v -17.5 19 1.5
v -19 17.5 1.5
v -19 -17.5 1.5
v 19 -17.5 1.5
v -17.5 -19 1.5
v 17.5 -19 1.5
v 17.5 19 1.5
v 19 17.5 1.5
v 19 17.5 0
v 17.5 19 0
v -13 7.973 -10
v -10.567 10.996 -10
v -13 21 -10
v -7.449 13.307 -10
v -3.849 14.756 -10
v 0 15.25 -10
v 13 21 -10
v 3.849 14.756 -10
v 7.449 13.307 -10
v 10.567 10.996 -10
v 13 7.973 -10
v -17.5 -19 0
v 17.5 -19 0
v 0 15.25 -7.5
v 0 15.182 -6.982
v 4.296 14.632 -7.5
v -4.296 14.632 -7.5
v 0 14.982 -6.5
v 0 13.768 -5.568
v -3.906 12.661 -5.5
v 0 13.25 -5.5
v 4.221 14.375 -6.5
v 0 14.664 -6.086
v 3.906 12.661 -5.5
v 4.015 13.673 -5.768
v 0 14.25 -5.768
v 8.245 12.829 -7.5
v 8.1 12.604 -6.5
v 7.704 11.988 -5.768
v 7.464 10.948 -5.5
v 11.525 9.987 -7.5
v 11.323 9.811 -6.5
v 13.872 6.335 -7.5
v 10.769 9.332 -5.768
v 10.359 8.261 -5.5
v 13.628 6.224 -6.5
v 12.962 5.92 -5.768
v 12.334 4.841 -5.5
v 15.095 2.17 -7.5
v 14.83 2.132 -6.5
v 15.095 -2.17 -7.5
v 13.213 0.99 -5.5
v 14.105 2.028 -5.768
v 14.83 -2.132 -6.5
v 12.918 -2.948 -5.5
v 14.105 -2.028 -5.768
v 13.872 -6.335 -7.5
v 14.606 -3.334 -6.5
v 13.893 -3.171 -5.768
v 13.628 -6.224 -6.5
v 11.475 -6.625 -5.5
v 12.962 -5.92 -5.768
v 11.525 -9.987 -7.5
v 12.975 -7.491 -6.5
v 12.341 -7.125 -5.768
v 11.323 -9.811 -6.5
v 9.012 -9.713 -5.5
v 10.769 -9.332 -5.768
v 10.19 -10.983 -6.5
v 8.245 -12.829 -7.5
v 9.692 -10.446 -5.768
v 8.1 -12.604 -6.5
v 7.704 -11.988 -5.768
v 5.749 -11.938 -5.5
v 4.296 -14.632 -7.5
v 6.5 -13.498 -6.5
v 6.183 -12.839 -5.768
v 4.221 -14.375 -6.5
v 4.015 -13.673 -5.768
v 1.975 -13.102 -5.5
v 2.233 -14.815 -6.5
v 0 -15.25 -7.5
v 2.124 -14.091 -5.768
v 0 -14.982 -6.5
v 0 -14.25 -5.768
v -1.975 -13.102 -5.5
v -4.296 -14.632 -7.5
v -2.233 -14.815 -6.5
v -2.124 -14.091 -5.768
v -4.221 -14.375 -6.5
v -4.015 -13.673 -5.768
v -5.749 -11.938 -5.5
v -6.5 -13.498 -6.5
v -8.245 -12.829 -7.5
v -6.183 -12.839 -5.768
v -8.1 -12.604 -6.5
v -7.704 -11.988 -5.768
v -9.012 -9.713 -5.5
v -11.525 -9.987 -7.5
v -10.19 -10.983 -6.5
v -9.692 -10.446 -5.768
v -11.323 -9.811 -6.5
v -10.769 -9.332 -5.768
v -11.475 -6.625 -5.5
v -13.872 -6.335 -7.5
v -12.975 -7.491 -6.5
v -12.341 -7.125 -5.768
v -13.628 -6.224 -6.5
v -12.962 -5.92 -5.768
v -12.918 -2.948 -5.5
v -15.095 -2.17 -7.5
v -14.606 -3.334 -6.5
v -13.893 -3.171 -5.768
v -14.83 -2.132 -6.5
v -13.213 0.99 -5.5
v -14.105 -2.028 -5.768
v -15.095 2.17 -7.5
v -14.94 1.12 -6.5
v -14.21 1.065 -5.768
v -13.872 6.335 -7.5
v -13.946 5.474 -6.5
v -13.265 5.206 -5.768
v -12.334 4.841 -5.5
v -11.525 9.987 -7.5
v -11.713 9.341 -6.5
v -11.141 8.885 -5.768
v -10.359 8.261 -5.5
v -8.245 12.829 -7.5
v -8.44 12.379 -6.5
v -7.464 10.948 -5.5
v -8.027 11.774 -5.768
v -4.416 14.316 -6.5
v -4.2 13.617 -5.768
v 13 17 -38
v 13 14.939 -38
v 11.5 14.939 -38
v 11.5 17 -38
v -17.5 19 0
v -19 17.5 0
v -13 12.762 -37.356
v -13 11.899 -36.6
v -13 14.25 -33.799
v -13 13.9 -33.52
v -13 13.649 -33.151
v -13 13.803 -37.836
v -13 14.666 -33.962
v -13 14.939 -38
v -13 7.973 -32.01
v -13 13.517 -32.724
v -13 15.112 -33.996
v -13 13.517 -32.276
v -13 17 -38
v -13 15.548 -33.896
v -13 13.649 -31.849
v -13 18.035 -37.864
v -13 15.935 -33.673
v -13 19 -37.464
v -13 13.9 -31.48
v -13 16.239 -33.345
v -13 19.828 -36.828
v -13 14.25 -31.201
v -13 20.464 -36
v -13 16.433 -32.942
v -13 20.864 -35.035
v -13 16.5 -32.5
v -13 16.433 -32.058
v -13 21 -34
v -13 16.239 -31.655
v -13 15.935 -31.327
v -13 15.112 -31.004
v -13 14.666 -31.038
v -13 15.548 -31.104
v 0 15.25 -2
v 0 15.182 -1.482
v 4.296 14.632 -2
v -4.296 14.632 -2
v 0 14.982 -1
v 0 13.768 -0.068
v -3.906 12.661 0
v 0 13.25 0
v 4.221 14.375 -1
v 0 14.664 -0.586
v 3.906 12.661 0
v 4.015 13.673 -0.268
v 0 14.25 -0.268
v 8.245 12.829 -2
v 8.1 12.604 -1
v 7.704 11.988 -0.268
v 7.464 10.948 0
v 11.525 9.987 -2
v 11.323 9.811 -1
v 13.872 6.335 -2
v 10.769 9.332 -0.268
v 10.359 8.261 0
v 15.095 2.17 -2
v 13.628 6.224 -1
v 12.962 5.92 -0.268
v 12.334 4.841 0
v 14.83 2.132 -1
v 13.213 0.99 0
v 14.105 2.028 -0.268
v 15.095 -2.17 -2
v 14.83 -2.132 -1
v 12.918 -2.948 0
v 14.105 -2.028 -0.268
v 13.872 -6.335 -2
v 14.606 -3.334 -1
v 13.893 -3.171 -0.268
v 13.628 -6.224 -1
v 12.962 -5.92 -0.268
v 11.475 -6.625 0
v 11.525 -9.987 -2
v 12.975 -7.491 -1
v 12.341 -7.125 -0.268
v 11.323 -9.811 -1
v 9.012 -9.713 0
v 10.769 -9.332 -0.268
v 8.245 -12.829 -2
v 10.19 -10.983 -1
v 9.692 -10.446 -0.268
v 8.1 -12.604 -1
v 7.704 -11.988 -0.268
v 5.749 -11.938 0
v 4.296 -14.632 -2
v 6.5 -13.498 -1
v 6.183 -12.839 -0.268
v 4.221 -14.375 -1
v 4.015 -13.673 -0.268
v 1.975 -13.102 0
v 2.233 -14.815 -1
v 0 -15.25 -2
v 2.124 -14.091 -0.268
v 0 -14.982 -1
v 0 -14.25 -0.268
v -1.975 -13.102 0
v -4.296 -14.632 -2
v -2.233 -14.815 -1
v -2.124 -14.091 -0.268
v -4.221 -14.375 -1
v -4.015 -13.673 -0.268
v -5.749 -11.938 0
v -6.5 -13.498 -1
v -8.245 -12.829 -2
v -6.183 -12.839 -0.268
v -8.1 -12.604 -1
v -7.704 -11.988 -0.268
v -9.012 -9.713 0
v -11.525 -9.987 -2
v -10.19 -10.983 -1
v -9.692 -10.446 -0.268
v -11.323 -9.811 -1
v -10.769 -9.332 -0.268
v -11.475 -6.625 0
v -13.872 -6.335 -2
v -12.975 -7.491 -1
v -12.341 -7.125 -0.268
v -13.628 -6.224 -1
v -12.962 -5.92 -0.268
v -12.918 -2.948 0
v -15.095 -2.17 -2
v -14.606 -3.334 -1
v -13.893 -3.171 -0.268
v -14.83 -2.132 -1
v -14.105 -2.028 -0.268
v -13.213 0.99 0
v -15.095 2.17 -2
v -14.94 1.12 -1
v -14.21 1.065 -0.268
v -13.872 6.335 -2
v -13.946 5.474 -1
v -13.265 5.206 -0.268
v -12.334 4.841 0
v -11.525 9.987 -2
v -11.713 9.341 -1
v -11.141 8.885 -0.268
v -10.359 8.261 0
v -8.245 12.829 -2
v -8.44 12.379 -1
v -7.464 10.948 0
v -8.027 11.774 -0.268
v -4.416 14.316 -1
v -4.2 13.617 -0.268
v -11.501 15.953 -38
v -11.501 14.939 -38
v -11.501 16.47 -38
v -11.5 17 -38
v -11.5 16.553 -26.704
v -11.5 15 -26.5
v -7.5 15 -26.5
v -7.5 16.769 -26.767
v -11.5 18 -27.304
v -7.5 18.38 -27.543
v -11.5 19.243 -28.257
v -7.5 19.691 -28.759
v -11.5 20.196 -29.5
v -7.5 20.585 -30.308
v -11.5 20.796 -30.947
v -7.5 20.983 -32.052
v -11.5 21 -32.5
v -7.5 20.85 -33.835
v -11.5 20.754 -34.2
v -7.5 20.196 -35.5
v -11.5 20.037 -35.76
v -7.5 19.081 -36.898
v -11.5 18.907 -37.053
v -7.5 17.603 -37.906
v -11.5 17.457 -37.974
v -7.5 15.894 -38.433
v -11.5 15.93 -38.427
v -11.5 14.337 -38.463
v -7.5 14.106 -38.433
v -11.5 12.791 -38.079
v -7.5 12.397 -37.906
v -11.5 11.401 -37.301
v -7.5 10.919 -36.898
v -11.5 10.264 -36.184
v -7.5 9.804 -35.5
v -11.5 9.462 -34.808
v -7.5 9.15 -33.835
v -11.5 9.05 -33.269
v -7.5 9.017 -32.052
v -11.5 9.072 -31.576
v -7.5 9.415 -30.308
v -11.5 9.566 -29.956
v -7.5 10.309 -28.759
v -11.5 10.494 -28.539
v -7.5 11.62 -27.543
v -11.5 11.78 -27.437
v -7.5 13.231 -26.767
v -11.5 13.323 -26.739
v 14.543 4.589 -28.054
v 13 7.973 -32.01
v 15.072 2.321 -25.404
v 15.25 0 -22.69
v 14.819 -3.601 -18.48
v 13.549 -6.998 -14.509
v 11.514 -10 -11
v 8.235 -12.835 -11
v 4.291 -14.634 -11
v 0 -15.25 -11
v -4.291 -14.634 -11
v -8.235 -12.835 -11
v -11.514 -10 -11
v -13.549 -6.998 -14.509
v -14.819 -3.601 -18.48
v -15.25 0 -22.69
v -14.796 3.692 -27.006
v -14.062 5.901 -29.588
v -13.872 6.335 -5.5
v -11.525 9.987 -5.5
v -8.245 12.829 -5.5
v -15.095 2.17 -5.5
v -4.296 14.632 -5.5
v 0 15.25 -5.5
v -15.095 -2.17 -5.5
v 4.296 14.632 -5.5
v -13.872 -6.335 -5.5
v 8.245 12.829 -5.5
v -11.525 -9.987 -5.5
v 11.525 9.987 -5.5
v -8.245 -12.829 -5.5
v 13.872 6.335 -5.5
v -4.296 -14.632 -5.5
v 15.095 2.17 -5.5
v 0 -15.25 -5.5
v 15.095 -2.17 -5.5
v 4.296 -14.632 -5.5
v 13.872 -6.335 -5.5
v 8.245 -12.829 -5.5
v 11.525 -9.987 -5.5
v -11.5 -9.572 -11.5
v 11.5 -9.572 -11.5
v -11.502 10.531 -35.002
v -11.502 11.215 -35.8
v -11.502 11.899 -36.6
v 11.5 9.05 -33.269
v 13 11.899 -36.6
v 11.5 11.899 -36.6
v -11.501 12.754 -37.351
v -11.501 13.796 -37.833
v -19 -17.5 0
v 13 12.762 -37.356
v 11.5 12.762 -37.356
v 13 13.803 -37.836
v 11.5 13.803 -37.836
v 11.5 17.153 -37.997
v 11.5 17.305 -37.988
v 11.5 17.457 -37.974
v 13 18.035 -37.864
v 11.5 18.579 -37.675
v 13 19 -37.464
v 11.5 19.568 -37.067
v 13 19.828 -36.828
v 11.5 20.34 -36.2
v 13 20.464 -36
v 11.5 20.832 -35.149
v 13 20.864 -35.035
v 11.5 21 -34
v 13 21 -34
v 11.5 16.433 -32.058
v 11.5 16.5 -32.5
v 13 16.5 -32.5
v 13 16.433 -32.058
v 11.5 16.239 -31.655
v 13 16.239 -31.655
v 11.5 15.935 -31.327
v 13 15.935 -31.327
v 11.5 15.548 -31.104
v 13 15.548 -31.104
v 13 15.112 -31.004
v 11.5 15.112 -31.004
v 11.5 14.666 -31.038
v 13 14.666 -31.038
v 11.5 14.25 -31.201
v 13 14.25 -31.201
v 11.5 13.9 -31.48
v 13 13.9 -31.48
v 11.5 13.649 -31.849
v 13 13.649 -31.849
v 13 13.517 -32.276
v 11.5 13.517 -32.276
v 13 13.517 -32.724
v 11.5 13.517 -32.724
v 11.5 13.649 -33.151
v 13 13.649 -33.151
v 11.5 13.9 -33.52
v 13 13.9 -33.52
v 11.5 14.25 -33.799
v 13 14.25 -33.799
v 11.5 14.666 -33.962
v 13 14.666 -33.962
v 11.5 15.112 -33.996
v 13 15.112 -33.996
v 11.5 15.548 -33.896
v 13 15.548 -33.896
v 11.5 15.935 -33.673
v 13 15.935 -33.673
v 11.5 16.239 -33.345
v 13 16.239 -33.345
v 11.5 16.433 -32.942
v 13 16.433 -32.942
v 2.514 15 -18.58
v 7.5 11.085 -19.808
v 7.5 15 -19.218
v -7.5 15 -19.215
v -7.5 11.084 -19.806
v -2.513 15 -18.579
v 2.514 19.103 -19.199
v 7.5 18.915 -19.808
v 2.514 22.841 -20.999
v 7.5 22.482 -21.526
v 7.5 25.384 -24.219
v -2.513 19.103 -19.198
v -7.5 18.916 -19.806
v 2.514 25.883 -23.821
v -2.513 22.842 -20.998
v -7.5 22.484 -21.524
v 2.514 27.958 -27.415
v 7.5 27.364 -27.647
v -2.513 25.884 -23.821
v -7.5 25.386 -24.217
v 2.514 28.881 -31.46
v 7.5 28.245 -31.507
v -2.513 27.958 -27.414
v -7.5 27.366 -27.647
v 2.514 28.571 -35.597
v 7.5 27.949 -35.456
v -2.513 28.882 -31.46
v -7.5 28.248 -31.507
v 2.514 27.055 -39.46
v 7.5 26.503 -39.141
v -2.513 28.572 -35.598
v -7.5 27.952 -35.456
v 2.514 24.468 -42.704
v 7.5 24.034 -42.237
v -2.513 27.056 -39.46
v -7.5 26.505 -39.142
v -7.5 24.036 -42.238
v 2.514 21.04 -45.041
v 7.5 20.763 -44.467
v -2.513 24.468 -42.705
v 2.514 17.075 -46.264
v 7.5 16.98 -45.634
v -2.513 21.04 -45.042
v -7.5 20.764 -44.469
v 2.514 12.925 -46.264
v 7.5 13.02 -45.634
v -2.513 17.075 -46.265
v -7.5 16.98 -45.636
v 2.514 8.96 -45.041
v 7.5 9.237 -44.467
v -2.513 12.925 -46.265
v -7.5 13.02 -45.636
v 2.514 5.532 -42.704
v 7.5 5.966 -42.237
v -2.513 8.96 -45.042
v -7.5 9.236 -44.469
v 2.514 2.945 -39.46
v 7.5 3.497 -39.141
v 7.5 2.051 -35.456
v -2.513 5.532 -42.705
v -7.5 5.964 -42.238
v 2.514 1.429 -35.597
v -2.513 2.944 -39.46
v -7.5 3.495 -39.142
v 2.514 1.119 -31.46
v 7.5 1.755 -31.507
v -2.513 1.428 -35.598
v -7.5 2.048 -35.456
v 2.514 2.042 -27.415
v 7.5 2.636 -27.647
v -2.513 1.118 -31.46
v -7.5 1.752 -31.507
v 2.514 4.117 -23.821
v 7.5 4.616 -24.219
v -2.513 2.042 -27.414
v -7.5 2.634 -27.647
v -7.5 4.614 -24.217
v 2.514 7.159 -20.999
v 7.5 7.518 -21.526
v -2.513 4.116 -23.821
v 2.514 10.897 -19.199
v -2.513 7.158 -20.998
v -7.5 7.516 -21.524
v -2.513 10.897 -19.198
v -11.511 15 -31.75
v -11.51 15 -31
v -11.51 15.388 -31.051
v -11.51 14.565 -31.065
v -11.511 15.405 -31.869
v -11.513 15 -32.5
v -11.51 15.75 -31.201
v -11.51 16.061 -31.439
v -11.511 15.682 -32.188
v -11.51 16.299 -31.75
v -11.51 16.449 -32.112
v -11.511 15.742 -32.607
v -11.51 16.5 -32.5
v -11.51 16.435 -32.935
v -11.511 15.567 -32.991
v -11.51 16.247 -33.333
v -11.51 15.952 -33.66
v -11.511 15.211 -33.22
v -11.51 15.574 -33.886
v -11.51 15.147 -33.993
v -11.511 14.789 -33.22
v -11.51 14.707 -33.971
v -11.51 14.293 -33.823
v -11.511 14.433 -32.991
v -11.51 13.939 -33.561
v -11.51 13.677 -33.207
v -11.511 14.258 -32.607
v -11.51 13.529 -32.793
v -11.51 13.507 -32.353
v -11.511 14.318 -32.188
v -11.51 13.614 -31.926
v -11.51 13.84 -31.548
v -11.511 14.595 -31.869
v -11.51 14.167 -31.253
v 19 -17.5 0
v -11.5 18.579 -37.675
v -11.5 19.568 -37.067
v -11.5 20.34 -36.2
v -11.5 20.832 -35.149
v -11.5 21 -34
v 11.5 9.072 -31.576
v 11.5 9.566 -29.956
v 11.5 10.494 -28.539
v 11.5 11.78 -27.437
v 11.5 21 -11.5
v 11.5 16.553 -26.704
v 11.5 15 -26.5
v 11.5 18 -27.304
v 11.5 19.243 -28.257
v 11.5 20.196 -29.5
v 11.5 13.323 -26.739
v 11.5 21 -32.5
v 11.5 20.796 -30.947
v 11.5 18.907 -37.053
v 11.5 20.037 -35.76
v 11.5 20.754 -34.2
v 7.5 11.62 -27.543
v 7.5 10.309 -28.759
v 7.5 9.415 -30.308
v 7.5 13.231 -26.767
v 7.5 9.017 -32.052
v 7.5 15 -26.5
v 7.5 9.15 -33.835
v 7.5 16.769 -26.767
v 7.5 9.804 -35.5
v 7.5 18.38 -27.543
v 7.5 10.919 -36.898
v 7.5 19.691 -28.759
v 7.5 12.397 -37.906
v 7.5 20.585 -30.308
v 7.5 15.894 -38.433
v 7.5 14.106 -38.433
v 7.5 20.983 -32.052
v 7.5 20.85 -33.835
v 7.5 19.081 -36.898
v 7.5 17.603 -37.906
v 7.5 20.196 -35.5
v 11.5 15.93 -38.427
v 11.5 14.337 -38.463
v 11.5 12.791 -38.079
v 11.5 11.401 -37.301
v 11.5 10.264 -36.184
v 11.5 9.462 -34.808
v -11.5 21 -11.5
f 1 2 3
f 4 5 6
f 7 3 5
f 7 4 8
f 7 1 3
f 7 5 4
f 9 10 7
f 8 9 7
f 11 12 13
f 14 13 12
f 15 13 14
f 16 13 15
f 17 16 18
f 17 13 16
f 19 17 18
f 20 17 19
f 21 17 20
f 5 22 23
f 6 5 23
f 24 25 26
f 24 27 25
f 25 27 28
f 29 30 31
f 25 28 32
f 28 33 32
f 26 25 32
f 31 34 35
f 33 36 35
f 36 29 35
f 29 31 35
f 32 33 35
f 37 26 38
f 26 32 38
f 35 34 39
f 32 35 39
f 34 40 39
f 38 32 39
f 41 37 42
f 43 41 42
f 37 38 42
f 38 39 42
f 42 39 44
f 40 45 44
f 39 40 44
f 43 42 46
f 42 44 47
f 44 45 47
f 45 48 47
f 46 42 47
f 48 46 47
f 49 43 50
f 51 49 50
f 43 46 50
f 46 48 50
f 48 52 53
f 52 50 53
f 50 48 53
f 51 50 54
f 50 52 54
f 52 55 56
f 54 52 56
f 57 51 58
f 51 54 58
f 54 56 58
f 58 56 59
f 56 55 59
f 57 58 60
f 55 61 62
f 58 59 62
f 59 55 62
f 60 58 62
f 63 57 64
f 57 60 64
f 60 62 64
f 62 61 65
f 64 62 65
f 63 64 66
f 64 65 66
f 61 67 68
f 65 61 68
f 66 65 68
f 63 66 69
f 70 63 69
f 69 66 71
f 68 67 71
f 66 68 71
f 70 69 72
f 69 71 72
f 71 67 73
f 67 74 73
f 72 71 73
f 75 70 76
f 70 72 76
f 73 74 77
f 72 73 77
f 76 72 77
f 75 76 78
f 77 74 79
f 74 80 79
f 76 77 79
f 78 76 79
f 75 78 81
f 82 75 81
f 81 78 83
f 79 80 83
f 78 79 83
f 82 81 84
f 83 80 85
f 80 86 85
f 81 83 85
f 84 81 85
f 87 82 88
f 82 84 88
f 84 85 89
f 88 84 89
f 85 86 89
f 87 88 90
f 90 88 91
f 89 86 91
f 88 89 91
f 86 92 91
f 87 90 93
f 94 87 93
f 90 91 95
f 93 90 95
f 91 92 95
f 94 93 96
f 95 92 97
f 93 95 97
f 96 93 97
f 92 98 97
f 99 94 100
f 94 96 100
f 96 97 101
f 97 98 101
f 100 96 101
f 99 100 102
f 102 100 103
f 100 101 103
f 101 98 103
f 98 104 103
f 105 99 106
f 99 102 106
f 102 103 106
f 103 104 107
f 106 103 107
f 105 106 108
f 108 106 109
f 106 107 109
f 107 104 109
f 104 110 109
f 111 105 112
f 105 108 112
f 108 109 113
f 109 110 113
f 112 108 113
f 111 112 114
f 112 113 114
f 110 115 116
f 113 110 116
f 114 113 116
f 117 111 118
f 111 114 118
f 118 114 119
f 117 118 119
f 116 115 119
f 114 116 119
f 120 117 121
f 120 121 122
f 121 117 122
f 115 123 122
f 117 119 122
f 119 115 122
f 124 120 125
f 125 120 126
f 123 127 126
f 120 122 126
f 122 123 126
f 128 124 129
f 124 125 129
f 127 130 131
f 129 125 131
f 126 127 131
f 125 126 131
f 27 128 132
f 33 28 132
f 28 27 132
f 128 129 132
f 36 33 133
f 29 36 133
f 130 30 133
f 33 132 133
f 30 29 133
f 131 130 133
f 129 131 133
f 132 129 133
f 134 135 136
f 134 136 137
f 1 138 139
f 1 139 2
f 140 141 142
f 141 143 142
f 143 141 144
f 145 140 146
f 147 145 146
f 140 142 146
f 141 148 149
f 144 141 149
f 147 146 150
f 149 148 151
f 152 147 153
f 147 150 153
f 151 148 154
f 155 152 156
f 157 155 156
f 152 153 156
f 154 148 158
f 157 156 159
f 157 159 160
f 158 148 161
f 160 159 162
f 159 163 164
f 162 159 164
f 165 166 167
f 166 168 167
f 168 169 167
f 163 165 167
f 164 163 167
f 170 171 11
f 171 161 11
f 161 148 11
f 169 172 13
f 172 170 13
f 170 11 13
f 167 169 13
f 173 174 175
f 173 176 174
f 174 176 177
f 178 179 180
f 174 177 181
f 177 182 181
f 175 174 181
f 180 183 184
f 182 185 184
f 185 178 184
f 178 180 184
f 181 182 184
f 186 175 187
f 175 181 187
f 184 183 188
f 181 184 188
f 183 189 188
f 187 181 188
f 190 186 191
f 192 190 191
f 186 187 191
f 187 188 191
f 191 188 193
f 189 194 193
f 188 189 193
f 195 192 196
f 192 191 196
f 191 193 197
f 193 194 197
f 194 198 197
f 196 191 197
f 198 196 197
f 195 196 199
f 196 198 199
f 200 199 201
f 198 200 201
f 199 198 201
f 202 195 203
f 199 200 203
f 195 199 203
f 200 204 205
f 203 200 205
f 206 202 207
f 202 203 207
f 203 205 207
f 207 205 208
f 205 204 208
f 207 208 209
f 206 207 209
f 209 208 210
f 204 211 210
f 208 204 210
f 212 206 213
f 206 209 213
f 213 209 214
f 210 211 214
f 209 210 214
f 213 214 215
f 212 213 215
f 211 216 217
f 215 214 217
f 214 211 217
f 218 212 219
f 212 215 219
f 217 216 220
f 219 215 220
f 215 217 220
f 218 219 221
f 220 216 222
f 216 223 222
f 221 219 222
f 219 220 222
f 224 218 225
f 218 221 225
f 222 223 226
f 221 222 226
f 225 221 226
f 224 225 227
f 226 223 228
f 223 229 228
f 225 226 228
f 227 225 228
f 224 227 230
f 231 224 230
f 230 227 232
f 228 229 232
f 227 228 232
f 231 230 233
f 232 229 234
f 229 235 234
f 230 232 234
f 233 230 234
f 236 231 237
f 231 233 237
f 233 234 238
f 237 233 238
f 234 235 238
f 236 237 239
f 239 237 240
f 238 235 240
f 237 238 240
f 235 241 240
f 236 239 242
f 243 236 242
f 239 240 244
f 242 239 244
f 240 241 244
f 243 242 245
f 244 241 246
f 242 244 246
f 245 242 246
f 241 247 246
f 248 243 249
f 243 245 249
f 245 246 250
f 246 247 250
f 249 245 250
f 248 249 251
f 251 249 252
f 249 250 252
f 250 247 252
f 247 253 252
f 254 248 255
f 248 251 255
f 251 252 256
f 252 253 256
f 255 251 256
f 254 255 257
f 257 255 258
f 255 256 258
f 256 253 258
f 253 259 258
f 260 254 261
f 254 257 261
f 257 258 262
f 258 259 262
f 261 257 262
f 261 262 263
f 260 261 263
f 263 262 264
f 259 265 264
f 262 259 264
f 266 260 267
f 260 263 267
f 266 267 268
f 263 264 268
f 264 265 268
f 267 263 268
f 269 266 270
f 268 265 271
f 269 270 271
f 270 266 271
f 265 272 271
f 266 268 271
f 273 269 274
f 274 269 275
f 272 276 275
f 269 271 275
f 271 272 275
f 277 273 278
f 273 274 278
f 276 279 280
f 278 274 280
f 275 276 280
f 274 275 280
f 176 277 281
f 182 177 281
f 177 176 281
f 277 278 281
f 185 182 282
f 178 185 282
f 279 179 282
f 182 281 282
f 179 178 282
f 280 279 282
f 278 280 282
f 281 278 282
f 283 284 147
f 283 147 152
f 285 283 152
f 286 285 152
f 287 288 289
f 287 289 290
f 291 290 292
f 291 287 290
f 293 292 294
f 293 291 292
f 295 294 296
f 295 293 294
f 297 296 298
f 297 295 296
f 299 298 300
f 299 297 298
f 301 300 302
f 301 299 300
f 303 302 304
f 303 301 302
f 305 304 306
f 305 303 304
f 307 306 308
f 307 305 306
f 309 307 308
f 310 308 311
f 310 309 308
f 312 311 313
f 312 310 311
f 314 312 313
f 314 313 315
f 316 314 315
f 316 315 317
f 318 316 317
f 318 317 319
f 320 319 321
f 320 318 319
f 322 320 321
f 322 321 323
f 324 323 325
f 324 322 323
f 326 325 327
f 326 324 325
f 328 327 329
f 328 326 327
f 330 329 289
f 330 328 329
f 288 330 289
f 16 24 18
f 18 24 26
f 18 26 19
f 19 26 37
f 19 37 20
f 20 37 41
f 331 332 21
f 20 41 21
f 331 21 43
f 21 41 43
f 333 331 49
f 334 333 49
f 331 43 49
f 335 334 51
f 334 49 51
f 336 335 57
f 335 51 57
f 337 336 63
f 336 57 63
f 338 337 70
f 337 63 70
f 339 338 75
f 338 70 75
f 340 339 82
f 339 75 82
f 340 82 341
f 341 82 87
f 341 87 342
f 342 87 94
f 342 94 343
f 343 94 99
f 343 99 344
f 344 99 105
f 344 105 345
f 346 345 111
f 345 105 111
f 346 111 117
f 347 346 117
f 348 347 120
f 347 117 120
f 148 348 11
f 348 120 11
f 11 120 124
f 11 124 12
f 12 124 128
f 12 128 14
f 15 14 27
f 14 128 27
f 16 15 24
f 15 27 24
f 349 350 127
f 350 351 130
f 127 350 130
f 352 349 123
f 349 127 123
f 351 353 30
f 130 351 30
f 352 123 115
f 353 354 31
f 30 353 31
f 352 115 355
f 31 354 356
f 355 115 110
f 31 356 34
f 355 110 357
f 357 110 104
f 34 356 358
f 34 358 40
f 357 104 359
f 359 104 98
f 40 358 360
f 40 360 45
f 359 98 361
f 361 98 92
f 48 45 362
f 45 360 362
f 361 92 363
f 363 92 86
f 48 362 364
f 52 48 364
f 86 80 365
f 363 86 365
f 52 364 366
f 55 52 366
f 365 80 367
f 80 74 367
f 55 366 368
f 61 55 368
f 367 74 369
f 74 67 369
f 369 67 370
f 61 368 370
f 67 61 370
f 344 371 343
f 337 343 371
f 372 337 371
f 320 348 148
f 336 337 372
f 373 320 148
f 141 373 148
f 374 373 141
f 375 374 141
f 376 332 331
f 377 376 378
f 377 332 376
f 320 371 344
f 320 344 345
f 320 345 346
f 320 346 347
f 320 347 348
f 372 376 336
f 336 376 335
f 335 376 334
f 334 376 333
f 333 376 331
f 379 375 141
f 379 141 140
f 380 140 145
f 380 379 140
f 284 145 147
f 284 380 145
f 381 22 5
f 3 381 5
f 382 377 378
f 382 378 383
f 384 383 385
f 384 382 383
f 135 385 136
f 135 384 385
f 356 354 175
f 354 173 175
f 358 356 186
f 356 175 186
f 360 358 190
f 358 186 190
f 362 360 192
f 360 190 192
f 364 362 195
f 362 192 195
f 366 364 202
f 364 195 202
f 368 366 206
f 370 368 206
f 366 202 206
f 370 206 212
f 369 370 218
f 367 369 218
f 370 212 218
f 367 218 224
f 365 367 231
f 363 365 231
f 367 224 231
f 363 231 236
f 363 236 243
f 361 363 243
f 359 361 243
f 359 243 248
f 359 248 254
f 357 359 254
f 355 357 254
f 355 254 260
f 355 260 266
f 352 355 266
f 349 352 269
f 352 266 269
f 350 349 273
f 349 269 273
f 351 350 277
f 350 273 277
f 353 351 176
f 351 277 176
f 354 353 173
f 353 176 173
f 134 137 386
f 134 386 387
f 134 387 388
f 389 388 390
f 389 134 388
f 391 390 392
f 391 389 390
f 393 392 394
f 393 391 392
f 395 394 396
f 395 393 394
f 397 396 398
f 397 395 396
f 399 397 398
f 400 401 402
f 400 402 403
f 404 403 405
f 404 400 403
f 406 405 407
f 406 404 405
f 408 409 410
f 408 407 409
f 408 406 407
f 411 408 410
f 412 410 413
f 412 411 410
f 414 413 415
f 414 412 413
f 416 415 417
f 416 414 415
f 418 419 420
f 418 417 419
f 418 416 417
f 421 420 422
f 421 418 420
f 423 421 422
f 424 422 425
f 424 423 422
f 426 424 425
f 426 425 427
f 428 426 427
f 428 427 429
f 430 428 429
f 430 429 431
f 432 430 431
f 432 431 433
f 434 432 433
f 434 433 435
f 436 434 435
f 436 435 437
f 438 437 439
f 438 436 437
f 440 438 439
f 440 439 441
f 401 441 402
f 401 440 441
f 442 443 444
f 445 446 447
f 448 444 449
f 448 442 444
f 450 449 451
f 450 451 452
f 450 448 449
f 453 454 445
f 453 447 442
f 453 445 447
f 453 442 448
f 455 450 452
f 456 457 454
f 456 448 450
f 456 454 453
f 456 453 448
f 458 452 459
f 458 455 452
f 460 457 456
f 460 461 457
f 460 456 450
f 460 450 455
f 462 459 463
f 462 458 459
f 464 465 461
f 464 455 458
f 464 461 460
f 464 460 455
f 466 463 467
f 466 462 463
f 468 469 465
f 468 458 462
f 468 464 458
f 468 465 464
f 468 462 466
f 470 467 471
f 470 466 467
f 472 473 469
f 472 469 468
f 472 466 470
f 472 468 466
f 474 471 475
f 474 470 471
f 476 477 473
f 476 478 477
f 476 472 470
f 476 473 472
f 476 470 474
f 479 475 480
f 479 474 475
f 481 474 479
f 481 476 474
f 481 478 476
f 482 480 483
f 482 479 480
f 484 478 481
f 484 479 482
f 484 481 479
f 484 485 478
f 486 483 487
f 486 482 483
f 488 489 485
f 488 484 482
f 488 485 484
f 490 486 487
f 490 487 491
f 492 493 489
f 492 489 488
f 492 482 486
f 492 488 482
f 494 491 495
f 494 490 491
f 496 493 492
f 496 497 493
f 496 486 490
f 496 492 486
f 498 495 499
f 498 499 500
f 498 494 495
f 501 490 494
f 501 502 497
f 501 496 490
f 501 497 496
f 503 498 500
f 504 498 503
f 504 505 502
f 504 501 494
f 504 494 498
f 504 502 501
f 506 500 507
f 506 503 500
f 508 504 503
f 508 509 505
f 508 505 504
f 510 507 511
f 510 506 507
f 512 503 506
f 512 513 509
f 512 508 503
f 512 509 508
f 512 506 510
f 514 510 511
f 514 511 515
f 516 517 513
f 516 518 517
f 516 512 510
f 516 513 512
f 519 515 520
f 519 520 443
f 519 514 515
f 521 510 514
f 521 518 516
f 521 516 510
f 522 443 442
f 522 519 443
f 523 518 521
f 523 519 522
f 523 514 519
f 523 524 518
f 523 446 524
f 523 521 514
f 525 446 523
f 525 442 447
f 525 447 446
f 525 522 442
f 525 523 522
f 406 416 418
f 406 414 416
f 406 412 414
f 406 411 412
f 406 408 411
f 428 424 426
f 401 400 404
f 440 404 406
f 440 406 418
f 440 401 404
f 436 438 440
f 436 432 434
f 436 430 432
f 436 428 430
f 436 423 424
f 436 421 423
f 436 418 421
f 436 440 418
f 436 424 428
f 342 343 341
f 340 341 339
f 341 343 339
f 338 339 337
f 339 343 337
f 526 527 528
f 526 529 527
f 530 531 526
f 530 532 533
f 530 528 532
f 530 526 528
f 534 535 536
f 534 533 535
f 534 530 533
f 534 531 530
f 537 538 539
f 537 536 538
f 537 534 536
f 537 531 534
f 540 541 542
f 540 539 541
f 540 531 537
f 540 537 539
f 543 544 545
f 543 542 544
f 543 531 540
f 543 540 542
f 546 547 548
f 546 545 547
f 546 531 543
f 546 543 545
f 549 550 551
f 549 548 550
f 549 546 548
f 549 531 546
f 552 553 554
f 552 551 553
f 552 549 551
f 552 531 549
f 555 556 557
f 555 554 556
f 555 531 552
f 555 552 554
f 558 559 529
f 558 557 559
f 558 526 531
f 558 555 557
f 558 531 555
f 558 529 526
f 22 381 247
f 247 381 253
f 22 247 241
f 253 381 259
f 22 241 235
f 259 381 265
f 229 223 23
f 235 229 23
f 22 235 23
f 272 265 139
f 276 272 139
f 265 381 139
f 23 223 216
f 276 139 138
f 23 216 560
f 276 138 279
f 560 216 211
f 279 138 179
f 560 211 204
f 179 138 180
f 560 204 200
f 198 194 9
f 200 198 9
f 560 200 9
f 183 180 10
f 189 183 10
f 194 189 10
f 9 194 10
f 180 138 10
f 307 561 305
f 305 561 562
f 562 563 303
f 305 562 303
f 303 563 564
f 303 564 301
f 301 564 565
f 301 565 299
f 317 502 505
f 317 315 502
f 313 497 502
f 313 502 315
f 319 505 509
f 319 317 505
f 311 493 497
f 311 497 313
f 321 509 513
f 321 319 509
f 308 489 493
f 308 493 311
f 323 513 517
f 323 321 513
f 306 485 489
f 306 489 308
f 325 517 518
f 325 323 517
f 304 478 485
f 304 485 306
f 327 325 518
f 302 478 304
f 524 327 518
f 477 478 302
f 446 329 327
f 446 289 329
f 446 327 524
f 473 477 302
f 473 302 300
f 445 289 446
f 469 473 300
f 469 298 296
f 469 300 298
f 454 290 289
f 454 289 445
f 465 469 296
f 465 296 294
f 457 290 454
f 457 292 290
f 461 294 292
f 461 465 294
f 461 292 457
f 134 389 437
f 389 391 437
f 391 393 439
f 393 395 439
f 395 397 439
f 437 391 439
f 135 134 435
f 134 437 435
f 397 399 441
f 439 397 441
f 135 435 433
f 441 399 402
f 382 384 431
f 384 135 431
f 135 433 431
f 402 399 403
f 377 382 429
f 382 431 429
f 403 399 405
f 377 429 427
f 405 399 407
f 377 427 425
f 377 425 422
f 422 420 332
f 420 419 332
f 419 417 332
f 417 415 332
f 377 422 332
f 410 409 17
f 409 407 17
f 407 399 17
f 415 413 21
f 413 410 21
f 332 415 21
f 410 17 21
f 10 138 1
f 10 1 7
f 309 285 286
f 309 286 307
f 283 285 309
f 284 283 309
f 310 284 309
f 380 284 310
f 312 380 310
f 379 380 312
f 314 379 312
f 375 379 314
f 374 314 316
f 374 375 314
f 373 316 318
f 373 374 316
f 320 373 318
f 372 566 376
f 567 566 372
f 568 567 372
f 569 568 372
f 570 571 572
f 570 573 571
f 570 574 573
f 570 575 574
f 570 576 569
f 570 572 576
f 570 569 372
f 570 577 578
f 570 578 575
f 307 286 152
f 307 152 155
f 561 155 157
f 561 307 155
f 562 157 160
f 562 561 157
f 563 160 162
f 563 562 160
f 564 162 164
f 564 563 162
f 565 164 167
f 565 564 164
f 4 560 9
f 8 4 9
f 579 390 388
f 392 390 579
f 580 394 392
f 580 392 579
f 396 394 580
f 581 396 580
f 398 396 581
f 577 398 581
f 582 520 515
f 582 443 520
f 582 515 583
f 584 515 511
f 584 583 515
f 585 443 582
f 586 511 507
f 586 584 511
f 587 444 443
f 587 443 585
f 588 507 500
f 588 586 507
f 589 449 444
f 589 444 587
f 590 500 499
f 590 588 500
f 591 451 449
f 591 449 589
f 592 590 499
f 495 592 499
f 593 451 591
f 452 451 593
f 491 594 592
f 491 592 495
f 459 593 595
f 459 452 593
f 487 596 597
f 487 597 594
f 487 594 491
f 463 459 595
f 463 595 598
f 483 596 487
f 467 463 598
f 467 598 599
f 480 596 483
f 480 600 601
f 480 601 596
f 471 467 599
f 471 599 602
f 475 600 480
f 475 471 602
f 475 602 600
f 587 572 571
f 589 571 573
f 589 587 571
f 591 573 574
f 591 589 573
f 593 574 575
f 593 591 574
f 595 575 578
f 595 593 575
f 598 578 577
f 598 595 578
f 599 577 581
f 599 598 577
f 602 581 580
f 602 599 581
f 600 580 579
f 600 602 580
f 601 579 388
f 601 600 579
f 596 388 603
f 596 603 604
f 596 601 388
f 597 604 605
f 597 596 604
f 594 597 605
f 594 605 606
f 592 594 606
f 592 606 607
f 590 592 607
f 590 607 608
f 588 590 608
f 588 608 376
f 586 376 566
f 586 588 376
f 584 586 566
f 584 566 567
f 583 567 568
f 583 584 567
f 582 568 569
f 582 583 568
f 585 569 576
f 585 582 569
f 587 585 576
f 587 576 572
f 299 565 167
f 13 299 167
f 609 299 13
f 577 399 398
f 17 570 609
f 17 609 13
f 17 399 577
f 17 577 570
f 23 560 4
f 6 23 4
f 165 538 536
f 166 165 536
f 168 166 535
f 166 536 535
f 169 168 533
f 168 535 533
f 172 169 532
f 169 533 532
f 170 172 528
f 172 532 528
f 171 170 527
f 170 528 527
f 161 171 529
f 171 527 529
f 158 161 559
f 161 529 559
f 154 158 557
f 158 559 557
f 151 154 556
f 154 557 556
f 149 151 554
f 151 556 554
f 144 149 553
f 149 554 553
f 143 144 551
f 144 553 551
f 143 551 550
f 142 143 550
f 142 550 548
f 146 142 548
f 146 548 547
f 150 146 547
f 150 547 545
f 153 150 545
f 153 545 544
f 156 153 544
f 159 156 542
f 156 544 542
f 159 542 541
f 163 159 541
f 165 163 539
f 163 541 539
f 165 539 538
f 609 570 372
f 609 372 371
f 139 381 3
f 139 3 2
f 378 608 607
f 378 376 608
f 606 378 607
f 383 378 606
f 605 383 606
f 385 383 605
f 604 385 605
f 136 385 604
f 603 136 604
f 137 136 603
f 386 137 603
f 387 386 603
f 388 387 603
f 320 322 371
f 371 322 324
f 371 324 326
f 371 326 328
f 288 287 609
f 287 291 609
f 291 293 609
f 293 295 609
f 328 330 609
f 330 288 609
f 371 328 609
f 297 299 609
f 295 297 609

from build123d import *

# Parameters (mm, degrees)
F0_W          = 38
F0_H          = 38
F1_DEPTH      = 1.5
F2_SIZE       = 1.5
F5_R          = 1.5
F6_DEPTH      = 15.25
F6_DEPTH_BACK = 15.25
F8_DEPTH      = 30
F9_W          = 23
F9_H          = 35
F10_DEPTH     = 40.001


with BuildPart() as f1:
    # F0 (on Top) → F1 (new body)
    with BuildSketch(Plane.XY):
        Rectangle(F0_W, F0_H)
    extrude(amount=F1_DEPTH)

    # F2
    f2_edges = [f1.edges().sort_by_distance(p)[0] for p in [
        (-19, 19, 0.75),
        (-19, -19, 0.75),
        (19, -19, 0.75),
        (19, 19, 0.75),
    ]]
    chamfer(f2_edges, length=F2_SIZE)

    # F3 (on Right) → F4 (revolve)
    with BuildSketch(Plane.YZ):
        with BuildLine():
            Line((13.25, 0), (0, 0))
            Line((0, 0), (0, -11))
            Line((0, -11), (15.25, -11))
            Line((15.25, -11), (15.25, -7.5))
            ThreePointArc((15.25, -7.5), (14.6642135624, -6.0857864376), (13.25, -5.5))
            Line((13.25, -5.5), (15.25, -5.5))
            Line((15.25, -5.5), (15.25, -2))
            ThreePointArc((15.25, -2), (14.6642135624, -0.5857864376), (13.25, 0))
        make_face()
    revolve(axis=Axis((0, 0, -0.5291854686), (0, 0, -1)))

    # F5 (on Right) → F6 (join, two sides)
    with BuildSketch(Plane.YZ) as f6_sk:
        with BuildLine():
            Line((-10, -10), (-10, -11))
            Line((-10, -11), (11.898905654, -36.6001472357))
            ThreePointArc((11.898905654, -36.6001472357), (13.2652844817, -37.63322095), (14.9385165423, -38))
            Line((14.9385165423, -38), (17, -38))
            ThreePointArc((17, -38), (19.8284271247, -36.8284271247), (21, -34))
            Line((21, -34), (21, -10))
            Line((21, -10), (-10, -10))
        make_face()
        with Locations((15, -32.5)):
            Circle(F5_R, mode=Mode.SUBTRACT)
    extrude(amount=F6_DEPTH)
    extrude(f6_sk.sketch, amount=-F6_DEPTH_BACK)

    # F7 (on face) → F8 (cut)
    with BuildSketch(Plane.XY.offset(-10)):
        with BuildLine():
            Line((-22.5, 21), (-22.5, -19))
            Line((-22.5, -19), (22.5, -19))
            Line((22.5, -19), (22.5, 21))
            Line((22.5, 21), (13, 21))
            Line((13, 21), (13, 7.9726093596))
            ThreePointArc((13, 7.9726093596), (0, -15.25), (-13, 7.9726093596))
            Line((-13, 7.9726093596), (-13, 21))
            Line((-13, 21), (-22.5, 21))
        make_face()
    extrude(amount=-F8_DEPTH, mode=Mode.SUBTRACT)

    # F9 (on face) → F10 (cut, through all)
    with BuildSketch(Plane(origin=(0, 21, 0), x_dir=(-1, 0, 0), z_dir=(0, 1, 0))):
        with Locations((0, -29)):
            Rectangle(F9_W, F9_H)
    extrude(amount=-F10_DEPTH, mode=Mode.SUBTRACT)

    # F12 (on offset) → F13 (revolve)
    with BuildSketch(Plane.XZ.offset(-15)):
        with BuildLine():
            Line((11.5, -32.5), (11.5, -26.5))
            Line((11.5, -26.5), (7.5, -26.5))
            Line((7.5, -26.5), (7.5, -19.2178355349))
            ThreePointArc((7.5, -19.2178355349), (0.0001190172, -18.5000005463), (-7.5, -19.215344209))
            Line((-7.5, -19.215344209), (-7.5, -26.5))
            Line((-7.5, -26.5), (-11.5, -26.5))
            Line((-11.5, -26.5), (-11.5129183978, -32.5))
            Line((-11.5129183978, -32.5), (11.5, -32.5))
        make_face()
    revolve(axis=Axis((0.3813263029, 15, -32.5), (-1, 0, 0)))


solid = f1.part
